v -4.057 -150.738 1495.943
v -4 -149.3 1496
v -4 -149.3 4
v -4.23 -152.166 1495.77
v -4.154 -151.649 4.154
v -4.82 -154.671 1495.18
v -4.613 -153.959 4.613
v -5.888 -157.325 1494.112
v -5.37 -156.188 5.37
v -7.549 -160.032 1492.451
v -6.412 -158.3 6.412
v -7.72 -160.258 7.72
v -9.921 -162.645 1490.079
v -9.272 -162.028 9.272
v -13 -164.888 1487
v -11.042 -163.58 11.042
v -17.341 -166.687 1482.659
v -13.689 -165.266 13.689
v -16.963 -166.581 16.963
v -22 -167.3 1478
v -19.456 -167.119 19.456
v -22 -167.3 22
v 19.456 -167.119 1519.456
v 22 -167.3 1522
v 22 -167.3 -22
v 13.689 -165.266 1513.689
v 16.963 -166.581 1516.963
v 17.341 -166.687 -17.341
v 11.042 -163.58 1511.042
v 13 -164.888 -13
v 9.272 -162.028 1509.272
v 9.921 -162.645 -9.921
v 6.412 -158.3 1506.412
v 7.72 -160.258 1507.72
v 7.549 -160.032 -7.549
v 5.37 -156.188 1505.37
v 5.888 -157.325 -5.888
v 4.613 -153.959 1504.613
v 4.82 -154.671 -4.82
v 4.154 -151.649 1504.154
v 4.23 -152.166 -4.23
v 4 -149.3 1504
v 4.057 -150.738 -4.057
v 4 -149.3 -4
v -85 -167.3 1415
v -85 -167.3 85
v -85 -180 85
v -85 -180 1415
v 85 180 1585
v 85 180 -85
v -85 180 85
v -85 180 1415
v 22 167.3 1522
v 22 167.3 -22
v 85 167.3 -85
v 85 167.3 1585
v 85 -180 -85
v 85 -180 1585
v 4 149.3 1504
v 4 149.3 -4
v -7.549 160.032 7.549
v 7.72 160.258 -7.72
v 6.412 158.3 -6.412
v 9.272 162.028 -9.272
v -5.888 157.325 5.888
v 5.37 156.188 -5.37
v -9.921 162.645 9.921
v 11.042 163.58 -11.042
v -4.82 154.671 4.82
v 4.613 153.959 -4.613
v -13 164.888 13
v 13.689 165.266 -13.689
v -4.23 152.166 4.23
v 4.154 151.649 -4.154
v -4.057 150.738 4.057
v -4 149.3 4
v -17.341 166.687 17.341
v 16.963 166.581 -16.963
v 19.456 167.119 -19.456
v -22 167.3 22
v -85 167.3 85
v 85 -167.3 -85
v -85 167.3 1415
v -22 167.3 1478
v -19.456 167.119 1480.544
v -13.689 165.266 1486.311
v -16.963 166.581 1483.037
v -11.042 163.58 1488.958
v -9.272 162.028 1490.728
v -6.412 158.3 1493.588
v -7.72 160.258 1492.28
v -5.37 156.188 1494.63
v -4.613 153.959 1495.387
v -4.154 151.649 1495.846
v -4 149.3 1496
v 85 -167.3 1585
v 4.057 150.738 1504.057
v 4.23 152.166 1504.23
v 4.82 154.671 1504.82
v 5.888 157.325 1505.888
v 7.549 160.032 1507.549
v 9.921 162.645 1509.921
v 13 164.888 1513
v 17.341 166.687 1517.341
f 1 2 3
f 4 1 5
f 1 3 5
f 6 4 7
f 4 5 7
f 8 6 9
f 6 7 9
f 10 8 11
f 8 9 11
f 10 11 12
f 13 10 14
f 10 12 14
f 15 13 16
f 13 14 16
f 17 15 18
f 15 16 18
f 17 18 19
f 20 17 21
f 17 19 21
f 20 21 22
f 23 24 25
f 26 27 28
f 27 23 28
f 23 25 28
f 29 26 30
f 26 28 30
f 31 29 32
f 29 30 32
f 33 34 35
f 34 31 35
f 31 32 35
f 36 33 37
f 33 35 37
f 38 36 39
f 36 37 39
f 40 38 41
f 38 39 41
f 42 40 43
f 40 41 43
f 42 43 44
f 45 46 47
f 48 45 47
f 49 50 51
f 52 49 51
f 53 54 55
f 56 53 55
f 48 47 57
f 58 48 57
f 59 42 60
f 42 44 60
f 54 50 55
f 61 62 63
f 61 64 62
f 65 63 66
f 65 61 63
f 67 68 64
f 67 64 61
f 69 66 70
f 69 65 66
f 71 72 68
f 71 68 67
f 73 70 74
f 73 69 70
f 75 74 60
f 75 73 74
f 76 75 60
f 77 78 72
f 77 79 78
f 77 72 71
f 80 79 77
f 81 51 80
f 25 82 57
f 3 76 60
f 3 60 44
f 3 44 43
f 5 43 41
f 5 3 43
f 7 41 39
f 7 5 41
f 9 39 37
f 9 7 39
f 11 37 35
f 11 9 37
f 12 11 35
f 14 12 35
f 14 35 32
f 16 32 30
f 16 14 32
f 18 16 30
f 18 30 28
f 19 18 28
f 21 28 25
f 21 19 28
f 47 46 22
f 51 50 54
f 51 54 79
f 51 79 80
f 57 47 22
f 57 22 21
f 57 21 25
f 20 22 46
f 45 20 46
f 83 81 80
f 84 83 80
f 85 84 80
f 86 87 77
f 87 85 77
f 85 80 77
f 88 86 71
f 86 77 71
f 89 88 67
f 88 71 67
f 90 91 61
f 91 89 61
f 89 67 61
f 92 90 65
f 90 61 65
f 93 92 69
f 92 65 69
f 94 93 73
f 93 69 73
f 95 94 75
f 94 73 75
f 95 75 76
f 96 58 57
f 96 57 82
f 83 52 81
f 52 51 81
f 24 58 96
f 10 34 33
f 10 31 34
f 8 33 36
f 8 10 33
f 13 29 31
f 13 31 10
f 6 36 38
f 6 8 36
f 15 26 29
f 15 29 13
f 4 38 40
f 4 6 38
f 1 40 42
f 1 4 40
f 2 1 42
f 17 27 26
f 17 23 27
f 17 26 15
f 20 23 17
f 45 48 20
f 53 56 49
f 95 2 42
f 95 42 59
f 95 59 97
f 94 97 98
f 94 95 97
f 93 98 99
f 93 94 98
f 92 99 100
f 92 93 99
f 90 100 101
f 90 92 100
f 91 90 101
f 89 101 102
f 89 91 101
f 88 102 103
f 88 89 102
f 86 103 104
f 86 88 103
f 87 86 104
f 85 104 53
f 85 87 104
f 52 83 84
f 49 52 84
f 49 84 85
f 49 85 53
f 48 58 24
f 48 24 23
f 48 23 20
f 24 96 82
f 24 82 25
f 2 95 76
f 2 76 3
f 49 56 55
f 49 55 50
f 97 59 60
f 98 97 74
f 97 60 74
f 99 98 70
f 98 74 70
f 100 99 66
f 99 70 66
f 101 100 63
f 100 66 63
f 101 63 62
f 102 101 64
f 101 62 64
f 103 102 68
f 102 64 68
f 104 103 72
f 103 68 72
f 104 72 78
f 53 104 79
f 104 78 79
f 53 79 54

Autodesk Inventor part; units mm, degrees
ref_plane "Start Plane" through (0, 0, -85) normal (0, 0, 1) x (1, 0, 0)
ref_plane "End Plane" through (0, 0, 1585) normal (0, 0, 1) x (1, 0, 0)
sketch "Sketch" plane through (0, 0, 0) normal (0, 0, 1) x (1, 0, 0)
  line L0 (-85, 167.3) -> (-22, 167.3)
  line L1 (-85, 180) -> (-85, 167.3)
  line L2 (85, 180) -> (-85, 180)
  line L3 (85, 167.3) -> (85, 180)
  line L4 (22, 167.3) -> (85, 167.3)
  line L5 (4, -149.3) -> (4, 149.3)
  line L6 (85, -167.3) -> (22, -167.3)
  line L7 (85, -180) -> (85, -167.3)
  line L8 (-85, -167.3) -> (-85, -180)
  line L9 (-22, -167.3) -> (-85, -167.3)
  line L10 (-4, 149.3) -> (-4, -149.3)
  line L11 (0, -252) -> (0, 252) construction
  line L12 (-4, -167.3) -> (4, -167.3) construction
  arc A0 (-22, -167.3) -> (-4, -149.3) centre (-22, -149.3) ccw
  arc A1 (-4, 149.3) -> (-22, 167.3) centre (-22, 149.3) ccw
  arc A2 (22, 167.3) -> (4, 149.3) centre (22, 149.3) ccw
  arc A3 (4, -149.3) -> (22, -167.3) centre (22, -149.3) ccw
  line L13 (-119, 0) -> (119, 0) construction
  line L14 (-85, -180) -> (85, -180)
  point P0 (-4, 167.3)
  point P1 (4, 167.3)
  point P2 (0, 0)
  point P3 (0, -167.3)
  point P4 (0, 0)
  dimension "d1" = 360
  dimension "d3" = 12.7
  dimension "d5" = 8
  dimension "d7" = 170
  dimension "d13" = 18
  dimension "d14" = 180
  dimension "d15" = 85
extrude "Body" add sketch "Sketch" along normal up to surface (1670 mm away) from surface at -85
sketch "Sketch3" plane through (0, 0, 0) normal (0, 0, 1) x (1, 0, 0)
  line L0 (0, 0) -> (10, 0)
ref_plane "Work Plane3" through (0, 0, 0) normal (0, -1, 0) x (1, 0, 0)
ref_plane "Work Plane4" through (85, 0, 1585) normal (-0.7071, 0, 0.7071) x (0.7071, 0, 0.7071)
split "Split1" plane through (85, 0, 1585) removes the side toward (-0.7071, 0, 0.7071)
ref_plane "Work Plane5" through (85, 0, -85) normal (-0.7071, 0, -0.7071) x (-0.7071, 0, 0.7071)
split "Split2" plane through (85, 0, -85) removes the side toward (-0.7071, 0, -0.7071)
sketch "Sketch4" plane through (0, 0, 0) normal (0, -1, 0) x (1, 0, 0)
  line L0 (-2, -85) -> (12, -85) projected
  line L1 (-2, 1585) -> (12, 1585) projected
  dimension "d19" = 1670
equation "\"d1\" = ParH"
equation "\"d3\" = t2"
equation "\"d5\" = t1"
equation "\"d7\" = b"
equation "\"d13\" = R1"
equation "\"d14\" = 0.5 * d1"
equation "\"d15\" = 0.5 * d7"
equation "\"d8\" = G_L"
equation "\"b\" = 170"
equation "\"ParH\" = 360"
equation "\"R1\" = 18"
equation "\"G_L\" = d19"
equation "\"t1\" = 8"
equation "\"t2\" = 12.7"
equation "\"G_OFFSET_START\" = 85"
equation "\"G_OFFSET_END\" = 85"
equation "\"d16\" = -G_OFFSET_START"
equation "\"d17\" = G_OFFSET_END + B_L"
equation "\"B_L\" = 1500"
properties part number "DIN 1025 - IPE 360-1670" material "Steel, Mild"
